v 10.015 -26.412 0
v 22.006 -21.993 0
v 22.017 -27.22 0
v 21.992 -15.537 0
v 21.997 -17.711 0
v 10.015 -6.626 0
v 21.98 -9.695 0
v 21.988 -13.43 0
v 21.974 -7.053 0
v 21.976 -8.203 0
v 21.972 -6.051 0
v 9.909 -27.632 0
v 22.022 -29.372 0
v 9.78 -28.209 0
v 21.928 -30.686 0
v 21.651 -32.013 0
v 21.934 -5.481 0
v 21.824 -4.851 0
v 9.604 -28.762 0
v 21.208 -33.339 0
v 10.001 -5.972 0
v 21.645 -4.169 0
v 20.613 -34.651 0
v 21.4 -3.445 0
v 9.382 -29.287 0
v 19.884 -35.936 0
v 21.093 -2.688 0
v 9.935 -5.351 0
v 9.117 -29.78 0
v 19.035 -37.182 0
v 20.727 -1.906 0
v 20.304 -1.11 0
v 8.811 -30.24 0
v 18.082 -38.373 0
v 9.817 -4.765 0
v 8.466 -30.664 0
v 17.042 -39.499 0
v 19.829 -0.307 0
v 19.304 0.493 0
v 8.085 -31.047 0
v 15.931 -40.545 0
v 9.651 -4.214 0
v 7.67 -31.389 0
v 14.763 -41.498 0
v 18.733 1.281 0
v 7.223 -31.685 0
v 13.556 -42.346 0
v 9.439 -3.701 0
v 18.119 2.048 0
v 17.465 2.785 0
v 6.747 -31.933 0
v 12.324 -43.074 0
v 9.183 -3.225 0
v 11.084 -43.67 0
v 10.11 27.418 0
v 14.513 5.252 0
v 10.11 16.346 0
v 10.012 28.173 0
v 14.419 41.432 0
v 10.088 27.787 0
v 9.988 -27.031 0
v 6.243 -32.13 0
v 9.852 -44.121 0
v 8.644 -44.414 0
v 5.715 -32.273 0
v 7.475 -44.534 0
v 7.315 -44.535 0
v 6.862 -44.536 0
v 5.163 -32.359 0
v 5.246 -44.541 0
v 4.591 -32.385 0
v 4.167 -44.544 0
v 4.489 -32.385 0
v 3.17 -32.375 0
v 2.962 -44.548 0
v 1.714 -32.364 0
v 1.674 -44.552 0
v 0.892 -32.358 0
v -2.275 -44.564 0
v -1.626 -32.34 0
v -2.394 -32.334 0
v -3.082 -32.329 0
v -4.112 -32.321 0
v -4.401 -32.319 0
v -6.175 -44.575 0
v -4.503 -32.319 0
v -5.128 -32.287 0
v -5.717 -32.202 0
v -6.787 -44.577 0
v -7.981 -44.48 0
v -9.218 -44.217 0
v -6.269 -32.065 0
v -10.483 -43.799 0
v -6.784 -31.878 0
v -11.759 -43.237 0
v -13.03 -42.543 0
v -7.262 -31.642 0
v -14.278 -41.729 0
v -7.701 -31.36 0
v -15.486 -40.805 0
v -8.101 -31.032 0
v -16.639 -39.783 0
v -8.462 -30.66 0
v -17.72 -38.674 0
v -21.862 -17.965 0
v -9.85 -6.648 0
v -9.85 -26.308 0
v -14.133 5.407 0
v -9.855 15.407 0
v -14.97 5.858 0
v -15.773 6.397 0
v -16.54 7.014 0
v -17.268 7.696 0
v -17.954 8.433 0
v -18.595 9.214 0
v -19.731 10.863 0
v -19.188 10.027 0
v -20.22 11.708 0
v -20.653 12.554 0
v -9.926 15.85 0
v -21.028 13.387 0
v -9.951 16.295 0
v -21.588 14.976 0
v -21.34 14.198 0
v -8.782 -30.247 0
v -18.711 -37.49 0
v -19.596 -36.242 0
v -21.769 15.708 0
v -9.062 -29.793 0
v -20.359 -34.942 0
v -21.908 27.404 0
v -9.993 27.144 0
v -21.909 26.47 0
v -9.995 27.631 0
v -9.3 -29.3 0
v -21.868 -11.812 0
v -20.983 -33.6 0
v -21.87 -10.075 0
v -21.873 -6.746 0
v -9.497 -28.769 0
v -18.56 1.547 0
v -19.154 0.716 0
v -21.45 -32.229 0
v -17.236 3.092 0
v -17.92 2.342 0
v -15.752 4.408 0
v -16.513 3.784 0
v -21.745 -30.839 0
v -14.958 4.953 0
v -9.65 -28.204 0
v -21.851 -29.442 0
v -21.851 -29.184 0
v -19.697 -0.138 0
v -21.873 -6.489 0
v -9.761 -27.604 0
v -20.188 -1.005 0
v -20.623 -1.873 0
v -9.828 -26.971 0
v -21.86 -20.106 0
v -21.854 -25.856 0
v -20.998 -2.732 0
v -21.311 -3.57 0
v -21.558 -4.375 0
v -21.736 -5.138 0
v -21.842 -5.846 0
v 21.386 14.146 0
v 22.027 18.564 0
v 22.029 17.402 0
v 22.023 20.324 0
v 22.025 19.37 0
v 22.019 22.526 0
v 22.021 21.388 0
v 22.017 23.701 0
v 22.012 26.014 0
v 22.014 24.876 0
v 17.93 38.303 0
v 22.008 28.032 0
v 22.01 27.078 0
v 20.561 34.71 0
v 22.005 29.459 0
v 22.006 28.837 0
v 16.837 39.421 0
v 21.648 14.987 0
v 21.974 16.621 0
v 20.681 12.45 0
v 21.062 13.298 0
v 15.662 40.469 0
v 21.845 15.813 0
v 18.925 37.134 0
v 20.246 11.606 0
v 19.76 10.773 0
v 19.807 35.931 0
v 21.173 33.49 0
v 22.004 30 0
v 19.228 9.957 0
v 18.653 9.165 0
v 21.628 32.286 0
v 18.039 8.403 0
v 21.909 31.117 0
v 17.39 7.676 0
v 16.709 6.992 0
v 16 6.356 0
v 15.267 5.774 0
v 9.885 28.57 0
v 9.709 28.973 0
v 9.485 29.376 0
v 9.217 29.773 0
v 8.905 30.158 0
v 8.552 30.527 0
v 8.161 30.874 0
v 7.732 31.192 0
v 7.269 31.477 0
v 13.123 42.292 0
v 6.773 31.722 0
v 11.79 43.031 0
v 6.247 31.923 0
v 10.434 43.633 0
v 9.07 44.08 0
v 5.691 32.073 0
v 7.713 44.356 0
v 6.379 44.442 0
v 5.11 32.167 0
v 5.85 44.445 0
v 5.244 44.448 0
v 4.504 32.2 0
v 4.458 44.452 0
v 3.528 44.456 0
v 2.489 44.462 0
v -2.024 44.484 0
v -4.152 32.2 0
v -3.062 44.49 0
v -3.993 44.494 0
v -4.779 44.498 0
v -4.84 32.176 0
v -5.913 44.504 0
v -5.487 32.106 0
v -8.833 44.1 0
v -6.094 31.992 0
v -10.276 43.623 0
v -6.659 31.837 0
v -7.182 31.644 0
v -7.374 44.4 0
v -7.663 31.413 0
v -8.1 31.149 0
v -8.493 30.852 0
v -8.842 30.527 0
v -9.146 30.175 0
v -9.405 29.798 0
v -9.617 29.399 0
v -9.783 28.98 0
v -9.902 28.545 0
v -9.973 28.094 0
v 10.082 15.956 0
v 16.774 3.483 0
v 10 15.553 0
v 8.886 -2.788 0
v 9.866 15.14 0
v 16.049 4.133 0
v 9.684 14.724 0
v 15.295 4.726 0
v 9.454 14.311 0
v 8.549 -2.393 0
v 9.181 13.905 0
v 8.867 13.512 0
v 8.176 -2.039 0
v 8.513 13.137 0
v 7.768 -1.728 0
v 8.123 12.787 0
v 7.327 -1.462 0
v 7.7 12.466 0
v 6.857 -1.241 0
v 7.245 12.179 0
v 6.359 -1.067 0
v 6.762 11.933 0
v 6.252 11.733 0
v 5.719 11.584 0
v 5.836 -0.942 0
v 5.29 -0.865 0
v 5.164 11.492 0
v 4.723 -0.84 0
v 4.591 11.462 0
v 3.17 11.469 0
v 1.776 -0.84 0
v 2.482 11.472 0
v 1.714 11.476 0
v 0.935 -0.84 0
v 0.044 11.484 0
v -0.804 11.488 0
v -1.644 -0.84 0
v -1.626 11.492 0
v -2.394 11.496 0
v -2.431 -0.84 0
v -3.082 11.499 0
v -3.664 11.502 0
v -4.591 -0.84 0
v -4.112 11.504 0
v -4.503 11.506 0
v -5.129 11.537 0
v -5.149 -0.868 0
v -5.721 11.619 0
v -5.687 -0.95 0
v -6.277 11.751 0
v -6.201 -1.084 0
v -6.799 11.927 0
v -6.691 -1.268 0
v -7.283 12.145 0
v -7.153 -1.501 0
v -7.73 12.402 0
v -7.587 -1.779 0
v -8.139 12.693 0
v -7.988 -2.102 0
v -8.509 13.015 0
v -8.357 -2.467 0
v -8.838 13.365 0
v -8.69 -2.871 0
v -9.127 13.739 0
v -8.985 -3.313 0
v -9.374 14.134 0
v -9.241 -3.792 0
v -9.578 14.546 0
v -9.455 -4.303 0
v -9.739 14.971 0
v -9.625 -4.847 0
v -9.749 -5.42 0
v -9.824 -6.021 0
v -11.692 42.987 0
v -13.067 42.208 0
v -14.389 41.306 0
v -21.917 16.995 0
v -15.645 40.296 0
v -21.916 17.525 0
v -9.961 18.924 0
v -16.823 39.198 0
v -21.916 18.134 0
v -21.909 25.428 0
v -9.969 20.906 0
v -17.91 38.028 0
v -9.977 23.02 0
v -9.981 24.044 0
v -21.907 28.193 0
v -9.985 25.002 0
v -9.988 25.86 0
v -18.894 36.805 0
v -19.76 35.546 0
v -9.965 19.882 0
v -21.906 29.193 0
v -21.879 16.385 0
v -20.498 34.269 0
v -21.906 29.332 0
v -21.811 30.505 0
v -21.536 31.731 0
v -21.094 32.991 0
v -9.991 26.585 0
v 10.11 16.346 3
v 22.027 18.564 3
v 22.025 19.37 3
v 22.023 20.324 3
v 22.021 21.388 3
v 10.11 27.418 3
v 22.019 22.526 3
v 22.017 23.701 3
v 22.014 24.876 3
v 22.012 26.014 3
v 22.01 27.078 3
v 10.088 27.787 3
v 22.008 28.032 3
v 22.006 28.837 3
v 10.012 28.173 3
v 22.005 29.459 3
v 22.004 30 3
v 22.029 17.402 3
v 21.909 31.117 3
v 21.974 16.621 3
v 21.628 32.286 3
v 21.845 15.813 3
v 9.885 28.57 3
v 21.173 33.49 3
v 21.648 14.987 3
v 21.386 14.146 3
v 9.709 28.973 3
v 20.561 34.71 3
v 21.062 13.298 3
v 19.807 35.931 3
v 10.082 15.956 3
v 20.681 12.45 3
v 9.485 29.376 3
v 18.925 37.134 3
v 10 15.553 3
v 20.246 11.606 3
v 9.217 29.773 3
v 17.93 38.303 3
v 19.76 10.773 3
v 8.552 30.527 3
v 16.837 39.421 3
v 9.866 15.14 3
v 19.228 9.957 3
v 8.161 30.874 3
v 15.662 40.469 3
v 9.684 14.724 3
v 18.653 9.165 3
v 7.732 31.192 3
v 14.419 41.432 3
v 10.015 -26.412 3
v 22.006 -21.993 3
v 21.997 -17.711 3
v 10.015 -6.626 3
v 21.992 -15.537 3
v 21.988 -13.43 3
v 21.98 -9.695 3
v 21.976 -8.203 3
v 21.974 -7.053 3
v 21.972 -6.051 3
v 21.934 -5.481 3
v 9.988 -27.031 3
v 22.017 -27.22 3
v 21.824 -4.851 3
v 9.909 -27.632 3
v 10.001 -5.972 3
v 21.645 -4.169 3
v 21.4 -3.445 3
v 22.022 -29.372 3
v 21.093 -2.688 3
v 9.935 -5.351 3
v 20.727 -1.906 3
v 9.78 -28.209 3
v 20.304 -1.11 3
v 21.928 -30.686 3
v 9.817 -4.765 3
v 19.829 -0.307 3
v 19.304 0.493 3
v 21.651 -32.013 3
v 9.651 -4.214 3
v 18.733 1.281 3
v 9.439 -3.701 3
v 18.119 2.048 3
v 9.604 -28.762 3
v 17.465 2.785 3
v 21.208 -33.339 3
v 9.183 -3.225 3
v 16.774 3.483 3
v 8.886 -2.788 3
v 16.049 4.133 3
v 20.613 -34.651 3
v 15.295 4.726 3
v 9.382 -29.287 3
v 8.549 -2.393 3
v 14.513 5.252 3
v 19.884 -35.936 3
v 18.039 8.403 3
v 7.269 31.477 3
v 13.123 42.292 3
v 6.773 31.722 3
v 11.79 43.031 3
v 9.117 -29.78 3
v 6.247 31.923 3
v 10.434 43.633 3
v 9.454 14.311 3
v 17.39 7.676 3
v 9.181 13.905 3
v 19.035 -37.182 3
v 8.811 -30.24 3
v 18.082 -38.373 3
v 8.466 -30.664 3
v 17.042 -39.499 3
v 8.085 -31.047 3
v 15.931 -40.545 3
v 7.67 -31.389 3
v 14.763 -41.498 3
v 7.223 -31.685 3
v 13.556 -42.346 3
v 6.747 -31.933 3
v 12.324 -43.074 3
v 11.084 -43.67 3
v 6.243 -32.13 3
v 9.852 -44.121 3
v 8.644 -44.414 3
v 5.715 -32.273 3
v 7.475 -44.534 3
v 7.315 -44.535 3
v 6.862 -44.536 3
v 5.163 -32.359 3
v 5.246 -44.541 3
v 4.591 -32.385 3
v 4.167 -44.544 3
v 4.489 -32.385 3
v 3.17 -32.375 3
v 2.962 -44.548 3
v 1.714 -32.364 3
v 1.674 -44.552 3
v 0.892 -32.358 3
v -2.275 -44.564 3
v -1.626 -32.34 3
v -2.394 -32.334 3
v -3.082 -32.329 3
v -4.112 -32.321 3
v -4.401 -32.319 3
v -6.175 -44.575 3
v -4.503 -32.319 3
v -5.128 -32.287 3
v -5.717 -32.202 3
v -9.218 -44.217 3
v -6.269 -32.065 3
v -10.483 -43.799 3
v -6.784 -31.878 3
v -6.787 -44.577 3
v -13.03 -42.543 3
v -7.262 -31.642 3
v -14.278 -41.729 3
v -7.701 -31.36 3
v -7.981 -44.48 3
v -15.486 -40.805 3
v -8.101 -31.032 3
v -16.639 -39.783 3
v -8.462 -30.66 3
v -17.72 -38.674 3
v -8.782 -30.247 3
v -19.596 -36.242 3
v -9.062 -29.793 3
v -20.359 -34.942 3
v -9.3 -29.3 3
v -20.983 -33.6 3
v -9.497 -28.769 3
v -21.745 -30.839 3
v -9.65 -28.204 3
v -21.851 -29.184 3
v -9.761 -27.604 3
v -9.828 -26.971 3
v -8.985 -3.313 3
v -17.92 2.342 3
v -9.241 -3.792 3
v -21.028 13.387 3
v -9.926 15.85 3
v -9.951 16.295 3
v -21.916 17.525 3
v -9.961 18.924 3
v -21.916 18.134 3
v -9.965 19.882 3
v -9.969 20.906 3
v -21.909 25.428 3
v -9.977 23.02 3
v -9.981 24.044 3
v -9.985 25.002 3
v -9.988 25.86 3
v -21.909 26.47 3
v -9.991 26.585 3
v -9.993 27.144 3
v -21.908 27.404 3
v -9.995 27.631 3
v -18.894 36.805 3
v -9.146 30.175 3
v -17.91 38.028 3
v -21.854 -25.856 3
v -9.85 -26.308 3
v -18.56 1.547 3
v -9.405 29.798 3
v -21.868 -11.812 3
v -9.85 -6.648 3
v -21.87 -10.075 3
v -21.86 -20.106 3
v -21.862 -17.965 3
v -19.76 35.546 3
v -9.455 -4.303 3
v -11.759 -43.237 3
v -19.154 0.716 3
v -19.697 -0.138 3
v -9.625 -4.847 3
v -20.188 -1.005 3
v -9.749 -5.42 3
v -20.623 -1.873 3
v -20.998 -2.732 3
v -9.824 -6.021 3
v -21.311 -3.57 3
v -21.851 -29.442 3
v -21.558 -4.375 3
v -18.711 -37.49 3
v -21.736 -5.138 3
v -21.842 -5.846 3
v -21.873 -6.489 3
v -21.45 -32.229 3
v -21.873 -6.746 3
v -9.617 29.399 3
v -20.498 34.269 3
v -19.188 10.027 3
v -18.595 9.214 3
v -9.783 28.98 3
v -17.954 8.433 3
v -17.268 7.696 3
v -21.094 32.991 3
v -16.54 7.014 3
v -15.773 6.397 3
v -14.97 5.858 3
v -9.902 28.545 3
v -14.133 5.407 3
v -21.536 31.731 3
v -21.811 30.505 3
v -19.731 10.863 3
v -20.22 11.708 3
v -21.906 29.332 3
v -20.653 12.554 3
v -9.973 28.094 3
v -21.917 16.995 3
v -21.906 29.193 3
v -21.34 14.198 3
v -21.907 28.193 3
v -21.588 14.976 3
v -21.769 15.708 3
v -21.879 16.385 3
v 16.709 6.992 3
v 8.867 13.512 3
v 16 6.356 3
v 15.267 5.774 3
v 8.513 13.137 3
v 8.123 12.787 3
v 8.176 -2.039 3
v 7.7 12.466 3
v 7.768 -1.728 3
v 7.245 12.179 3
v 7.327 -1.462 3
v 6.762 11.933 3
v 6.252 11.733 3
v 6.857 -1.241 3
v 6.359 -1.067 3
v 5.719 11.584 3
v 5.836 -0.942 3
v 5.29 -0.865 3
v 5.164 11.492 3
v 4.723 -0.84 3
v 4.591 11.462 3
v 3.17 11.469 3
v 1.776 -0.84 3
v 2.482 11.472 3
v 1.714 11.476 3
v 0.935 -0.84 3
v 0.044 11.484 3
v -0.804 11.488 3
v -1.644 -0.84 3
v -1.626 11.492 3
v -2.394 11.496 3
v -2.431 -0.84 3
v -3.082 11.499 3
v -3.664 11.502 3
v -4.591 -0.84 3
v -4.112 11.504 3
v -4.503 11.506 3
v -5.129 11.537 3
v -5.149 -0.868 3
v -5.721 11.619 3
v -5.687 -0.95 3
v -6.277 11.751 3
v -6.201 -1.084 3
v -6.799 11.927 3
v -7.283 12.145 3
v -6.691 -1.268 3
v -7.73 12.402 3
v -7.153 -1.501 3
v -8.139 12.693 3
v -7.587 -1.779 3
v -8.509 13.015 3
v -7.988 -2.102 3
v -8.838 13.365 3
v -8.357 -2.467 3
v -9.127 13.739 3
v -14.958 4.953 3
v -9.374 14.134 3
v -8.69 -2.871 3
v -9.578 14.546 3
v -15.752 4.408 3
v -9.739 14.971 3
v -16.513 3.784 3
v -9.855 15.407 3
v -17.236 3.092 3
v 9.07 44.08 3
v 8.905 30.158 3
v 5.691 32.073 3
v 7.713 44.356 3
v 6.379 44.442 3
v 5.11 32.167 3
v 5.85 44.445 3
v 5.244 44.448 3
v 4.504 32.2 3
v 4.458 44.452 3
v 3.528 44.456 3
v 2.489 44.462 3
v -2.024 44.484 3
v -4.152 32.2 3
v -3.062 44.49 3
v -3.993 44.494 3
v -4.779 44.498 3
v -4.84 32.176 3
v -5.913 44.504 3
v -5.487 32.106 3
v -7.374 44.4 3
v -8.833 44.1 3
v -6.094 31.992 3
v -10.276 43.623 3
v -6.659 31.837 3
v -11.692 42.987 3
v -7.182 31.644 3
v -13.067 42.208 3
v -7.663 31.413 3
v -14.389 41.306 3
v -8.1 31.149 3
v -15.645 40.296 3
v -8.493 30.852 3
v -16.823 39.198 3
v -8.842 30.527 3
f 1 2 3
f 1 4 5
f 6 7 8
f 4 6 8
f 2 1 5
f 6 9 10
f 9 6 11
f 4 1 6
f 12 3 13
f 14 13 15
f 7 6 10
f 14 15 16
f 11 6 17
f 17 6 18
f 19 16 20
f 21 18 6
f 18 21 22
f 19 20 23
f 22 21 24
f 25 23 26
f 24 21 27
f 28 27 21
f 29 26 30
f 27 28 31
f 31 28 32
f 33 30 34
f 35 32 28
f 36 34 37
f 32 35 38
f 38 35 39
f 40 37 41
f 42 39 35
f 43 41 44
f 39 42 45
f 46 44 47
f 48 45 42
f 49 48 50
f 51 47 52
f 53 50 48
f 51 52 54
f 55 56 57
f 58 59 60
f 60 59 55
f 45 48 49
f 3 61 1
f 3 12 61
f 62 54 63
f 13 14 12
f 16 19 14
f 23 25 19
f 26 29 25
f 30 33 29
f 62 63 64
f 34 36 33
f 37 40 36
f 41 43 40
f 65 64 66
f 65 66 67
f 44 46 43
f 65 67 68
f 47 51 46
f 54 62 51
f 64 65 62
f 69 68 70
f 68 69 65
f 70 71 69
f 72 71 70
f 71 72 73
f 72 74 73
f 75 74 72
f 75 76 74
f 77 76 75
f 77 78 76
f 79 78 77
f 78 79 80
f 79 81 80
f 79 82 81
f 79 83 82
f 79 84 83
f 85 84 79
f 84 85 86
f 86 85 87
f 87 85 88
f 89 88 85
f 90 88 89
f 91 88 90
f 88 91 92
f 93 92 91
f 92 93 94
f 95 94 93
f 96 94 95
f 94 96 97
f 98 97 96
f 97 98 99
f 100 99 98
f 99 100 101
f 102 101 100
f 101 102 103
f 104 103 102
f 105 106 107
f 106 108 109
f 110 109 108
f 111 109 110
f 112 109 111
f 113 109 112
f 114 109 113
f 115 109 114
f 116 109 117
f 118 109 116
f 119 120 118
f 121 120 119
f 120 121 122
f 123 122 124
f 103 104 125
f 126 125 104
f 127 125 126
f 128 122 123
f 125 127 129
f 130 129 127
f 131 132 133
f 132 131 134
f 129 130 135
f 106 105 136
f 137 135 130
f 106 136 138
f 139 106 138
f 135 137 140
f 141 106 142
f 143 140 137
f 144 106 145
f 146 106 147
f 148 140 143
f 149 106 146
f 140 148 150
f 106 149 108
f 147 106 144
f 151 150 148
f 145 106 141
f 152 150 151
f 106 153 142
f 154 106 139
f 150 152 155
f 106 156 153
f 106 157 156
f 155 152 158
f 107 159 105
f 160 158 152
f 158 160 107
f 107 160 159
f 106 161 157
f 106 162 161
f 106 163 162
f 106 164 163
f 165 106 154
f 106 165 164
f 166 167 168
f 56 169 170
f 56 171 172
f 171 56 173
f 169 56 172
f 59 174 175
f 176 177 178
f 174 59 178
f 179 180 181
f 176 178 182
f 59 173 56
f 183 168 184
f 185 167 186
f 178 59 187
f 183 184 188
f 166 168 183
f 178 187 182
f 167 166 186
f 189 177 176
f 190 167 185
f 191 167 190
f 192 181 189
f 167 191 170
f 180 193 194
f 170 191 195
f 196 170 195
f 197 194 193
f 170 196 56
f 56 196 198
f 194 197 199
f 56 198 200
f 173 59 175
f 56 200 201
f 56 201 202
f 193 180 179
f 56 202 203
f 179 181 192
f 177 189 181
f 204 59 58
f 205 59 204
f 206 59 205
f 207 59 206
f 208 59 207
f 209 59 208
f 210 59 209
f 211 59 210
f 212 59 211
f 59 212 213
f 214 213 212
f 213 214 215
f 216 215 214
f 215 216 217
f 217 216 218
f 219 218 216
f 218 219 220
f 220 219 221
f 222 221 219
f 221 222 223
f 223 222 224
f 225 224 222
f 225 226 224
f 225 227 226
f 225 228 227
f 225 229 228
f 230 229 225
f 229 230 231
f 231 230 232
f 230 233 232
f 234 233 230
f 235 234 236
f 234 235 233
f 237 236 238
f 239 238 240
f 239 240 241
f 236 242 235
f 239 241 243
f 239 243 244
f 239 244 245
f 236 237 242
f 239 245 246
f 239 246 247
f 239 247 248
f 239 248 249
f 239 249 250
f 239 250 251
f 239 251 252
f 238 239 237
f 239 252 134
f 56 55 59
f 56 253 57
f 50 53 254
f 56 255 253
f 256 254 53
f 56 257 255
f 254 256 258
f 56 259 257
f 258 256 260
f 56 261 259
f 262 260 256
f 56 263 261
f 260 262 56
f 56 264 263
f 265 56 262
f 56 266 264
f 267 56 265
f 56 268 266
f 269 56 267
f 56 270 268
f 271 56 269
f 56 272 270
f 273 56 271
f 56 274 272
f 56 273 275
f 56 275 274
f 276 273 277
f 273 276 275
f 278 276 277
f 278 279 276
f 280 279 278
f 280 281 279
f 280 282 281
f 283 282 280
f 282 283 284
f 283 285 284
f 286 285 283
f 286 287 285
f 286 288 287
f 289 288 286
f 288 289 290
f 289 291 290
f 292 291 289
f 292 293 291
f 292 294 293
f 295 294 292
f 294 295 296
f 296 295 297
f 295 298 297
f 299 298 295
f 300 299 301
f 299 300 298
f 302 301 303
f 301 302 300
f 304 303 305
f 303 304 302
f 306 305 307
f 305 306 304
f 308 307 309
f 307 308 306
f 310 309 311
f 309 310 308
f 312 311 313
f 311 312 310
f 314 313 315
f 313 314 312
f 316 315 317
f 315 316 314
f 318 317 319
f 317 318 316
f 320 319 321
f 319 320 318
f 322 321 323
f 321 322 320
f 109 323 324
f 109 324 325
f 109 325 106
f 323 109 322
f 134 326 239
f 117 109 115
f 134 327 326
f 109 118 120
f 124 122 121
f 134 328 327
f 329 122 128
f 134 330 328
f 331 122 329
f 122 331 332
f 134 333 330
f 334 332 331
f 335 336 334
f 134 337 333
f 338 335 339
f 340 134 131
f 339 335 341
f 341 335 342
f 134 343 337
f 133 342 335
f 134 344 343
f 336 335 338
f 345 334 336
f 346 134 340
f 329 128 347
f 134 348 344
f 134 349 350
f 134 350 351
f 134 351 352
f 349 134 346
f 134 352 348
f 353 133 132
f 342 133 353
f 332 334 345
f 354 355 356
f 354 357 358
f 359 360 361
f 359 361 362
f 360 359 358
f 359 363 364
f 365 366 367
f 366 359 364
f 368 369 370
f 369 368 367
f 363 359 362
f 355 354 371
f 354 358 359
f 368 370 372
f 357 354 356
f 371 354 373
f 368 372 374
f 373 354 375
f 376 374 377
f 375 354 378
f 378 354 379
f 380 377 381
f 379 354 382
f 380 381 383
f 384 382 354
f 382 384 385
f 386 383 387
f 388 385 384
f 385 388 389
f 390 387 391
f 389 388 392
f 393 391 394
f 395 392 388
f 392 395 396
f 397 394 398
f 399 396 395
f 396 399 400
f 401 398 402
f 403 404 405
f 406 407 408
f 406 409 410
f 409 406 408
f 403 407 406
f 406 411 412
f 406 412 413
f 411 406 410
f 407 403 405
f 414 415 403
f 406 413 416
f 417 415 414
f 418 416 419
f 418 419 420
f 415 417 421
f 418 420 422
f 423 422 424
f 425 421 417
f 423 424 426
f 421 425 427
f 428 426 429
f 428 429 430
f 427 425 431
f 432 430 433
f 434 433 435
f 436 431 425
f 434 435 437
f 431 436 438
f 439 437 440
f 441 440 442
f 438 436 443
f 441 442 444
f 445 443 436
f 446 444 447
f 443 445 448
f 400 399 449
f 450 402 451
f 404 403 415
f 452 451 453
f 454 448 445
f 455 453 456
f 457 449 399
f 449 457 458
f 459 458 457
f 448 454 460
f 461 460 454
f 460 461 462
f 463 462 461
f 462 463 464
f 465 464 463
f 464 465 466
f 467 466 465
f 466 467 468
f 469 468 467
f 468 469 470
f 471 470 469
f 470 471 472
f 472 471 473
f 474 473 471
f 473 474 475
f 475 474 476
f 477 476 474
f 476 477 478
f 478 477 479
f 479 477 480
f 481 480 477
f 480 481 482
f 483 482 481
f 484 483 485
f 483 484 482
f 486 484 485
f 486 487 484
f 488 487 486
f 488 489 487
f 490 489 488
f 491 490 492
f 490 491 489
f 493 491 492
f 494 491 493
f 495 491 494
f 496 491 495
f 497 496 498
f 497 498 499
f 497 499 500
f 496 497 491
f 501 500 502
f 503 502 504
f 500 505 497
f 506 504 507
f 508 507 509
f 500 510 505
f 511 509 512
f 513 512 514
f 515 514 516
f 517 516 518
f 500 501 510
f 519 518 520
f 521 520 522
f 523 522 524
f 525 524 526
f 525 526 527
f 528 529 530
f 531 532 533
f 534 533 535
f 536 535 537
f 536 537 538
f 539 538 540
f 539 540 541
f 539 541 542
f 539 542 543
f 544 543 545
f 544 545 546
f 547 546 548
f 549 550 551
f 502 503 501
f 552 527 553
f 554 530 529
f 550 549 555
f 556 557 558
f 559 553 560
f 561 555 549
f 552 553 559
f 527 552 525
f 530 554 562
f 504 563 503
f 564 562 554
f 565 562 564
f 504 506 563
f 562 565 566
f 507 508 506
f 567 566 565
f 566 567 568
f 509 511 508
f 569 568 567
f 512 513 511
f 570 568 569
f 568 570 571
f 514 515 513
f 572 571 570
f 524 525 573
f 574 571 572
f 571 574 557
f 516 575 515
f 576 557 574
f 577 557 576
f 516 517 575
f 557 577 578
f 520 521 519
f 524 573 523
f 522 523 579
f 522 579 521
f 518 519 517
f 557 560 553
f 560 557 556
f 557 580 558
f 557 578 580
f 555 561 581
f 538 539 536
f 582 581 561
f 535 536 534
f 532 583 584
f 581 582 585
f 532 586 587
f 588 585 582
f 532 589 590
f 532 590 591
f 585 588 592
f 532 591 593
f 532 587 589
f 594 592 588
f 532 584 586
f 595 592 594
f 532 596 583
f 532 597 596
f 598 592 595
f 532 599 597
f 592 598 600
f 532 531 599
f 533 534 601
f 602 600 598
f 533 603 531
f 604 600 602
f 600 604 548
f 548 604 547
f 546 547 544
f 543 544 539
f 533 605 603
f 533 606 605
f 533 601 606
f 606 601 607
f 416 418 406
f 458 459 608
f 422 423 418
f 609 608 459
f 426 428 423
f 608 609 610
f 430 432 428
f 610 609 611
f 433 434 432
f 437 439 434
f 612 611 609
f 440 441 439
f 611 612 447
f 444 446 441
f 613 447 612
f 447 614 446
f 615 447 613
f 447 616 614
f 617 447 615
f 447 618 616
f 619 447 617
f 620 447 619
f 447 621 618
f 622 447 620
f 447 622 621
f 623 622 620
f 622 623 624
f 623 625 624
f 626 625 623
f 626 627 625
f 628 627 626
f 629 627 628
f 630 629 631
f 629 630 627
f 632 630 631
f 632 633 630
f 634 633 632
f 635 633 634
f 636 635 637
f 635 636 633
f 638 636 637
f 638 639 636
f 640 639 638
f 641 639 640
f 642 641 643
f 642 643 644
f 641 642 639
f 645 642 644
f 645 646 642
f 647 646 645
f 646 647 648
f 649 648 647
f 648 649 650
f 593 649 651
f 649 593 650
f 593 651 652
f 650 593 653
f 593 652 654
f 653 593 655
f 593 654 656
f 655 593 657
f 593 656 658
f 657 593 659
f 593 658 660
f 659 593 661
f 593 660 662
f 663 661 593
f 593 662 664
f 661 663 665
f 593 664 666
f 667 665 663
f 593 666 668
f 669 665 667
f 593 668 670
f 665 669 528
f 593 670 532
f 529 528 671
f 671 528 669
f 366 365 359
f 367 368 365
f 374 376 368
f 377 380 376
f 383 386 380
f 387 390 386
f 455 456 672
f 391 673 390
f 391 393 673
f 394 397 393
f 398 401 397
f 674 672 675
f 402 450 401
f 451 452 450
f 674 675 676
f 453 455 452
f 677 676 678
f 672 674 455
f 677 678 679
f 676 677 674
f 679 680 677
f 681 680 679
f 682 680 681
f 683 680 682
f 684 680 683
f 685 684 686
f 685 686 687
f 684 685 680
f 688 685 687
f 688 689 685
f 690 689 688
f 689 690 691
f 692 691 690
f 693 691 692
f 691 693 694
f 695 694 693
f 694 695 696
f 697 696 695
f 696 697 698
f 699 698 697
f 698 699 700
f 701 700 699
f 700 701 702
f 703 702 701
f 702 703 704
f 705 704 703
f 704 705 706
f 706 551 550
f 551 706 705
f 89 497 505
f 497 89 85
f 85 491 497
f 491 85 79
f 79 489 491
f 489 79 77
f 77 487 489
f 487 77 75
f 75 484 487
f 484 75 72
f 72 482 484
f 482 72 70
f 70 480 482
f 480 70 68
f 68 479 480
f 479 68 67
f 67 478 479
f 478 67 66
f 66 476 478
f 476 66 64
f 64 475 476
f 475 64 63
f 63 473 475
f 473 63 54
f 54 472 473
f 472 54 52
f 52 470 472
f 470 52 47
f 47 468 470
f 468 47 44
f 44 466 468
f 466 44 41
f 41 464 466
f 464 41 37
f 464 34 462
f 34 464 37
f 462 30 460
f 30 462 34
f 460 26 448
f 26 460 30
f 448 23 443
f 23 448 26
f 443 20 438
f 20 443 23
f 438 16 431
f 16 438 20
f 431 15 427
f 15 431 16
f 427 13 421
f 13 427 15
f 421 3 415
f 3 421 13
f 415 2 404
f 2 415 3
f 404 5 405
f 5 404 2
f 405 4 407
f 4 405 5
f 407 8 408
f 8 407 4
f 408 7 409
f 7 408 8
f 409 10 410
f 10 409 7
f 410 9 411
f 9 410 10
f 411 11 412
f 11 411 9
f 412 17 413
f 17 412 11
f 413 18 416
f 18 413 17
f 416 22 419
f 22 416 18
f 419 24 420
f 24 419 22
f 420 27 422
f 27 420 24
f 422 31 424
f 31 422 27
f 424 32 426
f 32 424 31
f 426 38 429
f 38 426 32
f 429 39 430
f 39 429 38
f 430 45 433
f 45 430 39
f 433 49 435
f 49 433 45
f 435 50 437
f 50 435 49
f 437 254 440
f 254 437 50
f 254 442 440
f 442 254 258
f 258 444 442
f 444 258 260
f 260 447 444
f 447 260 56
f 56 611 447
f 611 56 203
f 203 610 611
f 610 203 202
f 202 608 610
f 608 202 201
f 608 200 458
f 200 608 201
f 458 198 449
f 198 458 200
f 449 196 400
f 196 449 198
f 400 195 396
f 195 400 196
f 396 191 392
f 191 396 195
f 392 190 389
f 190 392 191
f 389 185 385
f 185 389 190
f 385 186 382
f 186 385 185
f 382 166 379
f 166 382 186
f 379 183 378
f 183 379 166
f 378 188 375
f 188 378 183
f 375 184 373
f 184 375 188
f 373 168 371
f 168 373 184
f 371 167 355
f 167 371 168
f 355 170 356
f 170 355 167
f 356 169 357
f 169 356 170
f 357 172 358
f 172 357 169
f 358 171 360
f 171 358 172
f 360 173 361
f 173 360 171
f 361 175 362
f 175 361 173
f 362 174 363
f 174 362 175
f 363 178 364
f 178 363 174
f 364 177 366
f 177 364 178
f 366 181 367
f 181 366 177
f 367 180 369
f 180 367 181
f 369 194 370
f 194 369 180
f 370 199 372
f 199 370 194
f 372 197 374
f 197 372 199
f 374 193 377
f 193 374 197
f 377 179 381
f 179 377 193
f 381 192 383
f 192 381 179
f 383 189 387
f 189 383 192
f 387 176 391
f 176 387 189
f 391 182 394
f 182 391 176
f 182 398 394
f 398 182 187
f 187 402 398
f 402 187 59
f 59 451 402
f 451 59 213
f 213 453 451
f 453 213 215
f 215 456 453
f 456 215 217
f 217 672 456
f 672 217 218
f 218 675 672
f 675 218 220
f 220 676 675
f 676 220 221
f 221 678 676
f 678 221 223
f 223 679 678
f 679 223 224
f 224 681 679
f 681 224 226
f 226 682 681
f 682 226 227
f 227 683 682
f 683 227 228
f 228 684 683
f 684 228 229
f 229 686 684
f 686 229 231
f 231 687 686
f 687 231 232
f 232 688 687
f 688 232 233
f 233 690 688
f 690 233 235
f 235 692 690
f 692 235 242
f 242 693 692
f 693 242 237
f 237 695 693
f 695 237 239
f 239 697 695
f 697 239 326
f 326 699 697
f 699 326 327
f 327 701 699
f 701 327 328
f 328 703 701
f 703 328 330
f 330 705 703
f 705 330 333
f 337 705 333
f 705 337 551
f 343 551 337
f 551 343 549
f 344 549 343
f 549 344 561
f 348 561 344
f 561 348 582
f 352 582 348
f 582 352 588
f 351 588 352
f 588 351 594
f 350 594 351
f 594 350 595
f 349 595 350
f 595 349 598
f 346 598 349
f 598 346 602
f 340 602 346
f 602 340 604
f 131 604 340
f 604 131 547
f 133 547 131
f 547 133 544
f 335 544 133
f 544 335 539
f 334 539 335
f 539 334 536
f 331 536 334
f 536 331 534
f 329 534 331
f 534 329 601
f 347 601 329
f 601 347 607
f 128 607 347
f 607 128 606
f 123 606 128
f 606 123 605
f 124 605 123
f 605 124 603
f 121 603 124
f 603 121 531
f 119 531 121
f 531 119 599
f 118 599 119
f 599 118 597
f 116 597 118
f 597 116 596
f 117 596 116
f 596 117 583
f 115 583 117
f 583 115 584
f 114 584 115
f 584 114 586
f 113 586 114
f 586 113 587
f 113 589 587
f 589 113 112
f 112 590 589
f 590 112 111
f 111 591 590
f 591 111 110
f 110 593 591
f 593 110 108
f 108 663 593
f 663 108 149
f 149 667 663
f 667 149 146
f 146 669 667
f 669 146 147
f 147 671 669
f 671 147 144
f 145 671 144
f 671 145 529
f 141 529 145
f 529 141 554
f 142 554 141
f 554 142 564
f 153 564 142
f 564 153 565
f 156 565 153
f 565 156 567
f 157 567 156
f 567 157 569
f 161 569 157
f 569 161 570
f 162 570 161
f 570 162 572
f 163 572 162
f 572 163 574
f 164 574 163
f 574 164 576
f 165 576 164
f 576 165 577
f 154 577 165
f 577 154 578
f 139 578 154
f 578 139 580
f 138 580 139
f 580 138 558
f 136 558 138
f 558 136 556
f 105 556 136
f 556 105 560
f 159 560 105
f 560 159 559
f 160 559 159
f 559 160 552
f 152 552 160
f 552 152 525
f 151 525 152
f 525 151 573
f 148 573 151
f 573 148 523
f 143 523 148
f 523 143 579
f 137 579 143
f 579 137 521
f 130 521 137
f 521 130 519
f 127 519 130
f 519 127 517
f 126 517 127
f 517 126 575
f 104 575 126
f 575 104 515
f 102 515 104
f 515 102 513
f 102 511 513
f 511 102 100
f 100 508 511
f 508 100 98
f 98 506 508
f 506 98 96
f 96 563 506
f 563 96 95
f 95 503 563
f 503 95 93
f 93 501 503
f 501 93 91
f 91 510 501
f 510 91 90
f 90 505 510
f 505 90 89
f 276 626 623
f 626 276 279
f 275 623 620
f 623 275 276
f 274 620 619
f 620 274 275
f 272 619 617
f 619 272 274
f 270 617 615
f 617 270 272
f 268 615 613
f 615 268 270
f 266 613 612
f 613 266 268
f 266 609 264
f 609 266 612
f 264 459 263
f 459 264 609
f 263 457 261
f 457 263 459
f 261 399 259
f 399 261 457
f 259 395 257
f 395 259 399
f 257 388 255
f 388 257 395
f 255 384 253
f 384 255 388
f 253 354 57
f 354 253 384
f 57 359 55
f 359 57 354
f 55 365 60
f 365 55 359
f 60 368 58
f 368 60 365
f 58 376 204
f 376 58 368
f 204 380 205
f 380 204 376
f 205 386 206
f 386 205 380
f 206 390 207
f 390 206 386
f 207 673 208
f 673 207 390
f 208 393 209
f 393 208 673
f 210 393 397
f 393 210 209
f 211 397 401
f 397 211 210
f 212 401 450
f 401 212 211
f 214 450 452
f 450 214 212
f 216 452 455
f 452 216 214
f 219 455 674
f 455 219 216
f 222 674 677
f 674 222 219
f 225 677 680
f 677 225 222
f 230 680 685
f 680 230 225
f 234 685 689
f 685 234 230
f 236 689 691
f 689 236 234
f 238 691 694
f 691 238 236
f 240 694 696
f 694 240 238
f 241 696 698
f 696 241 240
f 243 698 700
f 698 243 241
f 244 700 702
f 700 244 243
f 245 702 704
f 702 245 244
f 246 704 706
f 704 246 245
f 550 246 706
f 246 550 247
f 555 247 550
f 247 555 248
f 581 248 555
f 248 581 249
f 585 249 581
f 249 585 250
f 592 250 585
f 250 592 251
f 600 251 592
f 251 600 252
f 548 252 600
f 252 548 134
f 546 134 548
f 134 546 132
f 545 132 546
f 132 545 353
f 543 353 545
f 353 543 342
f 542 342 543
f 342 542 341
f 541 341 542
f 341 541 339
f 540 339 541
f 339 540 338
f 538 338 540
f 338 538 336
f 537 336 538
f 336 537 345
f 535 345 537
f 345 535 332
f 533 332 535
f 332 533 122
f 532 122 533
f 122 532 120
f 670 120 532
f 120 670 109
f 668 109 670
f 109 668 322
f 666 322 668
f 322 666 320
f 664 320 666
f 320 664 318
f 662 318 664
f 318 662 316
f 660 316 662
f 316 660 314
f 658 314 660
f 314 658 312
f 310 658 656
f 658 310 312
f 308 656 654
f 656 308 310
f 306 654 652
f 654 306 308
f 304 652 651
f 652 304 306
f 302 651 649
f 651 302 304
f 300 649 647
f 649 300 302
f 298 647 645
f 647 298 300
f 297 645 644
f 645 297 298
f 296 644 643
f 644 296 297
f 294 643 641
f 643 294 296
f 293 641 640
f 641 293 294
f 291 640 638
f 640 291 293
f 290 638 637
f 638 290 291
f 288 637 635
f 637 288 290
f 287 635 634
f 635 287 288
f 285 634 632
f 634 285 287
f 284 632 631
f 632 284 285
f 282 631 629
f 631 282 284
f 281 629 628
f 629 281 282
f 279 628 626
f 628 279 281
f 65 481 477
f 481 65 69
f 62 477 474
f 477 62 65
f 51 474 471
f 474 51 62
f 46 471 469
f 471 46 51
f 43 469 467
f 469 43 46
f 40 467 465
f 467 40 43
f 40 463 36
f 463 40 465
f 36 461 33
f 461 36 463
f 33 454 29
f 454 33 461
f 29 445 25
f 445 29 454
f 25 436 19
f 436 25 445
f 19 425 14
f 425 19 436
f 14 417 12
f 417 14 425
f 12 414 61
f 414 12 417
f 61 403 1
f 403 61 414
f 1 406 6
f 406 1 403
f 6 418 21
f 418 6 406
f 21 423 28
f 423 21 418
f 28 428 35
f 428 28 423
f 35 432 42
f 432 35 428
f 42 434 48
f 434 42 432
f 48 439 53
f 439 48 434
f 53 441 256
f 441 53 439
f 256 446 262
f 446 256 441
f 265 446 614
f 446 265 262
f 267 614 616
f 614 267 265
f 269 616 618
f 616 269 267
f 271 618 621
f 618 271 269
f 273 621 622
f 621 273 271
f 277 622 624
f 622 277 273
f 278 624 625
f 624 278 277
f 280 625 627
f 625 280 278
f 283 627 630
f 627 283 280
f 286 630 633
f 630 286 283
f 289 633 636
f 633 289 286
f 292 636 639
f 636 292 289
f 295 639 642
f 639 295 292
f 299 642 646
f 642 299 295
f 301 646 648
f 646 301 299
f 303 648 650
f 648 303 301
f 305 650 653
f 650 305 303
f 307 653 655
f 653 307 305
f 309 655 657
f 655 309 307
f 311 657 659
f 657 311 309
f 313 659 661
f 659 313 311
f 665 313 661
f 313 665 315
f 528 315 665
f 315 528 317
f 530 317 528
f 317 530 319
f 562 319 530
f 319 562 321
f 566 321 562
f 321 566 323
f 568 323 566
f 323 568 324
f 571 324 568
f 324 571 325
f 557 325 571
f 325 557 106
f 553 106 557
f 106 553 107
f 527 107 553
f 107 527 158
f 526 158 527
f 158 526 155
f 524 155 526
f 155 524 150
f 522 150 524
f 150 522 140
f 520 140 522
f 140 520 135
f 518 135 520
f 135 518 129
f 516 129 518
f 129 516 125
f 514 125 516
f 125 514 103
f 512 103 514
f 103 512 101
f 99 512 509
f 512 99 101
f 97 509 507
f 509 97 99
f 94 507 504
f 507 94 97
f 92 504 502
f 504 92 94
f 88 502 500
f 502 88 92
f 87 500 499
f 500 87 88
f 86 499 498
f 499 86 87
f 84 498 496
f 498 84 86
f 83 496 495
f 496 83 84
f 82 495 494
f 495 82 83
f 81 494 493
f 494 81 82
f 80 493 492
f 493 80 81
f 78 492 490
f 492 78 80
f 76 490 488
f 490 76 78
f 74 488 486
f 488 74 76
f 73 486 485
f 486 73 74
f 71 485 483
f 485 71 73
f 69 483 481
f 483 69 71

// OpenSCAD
// Generated from 交通部公路局（原交通部公路總局）「新式號牌使用之英文字、數字字體」author trace
fudge = 0.1;

module glyph_2012_8(h = 3) {
  difference() {
    linear_extrude(height = h)
      polygon(points = [[-5.9135, 44.5041], [-7.3743, 44.3997], [-8.8327, 44.1003], [-10.276, 43.6235], [-11.6916, 42.987], [-13.0668, 42.2085], [-14.389, 41.3057], [-15.6454, 40.2963], [-16.8234, 39.198], [-17.9104, 38.0284], [-18.8936, 36.8052], [-19.7605, 35.5461], [-20.4983, 34.2689], [-21.0945, 32.9912], [-21.5362, 31.7306], [-21.811, 30.5049], [-21.906, 29.3318], [-21.9062, 29.1932], [-21.9065, 28.8017], [-21.907, 28.1933], [-21.9077, 27.4041], [-21.9086, 26.4705], [-21.9095, 25.4283], [-21.9105, 24.3139], [-21.9115, 23.1634], [-21.9125, 22.0129], [-21.9135, 20.8985], [-21.9144, 19.8564], [-21.9152, 18.9227], [-21.9159, 18.1336], [-21.9165, 17.5252], [-21.9168, 17.1336], [-21.9169, 16.9951], [-21.8795, 16.3852], [-21.769, 15.7085], [-21.5884, 14.9759], [-21.3404, 14.1985], [-21.0278, 13.3875], [-20.6535, 12.5538], [-20.2202, 11.7085], [-19.7308, 10.8627], [-19.1881, 10.0275], [-18.5949, 9.214], [-17.954, 8.4331], [-17.2683, 7.696], [-16.5404, 7.0137], [-15.7734, 6.3973], [-14.9699, 5.858], [-14.1328, 5.4066], [-14.9578, 4.9528], [-15.7522, 4.4083], [-16.5129, 3.7843], [-17.2365, 3.092], [-17.92, 2.3424], [-18.5601, 1.5467], [-19.1536, 0.7162], [-19.6974, -0.1381], [-20.1882, -1.0049], [-20.6229, -1.8733], [-20.9983, -2.7319], [-21.3111, -3.5696], [-21.5582, -4.3753], [-21.7363, -5.1378], [-21.8424, -5.846], [-21.8731, -6.4887], [-21.8728, -6.7465], [-21.8721, -7.475], [-21.871, -8.607], [-21.8696, -10.0752], [-21.868, -11.8124], [-21.8661, -13.7513], [-21.8641, -15.8247], [-21.862, -17.9654], [-21.86, -20.106], [-21.858, -22.1795], [-21.8561, -24.1184], [-21.8544, -25.8556], [-21.853, -27.3238], [-21.8519, -28.4558], [-21.8512, -29.1843], [-21.851, -29.442], [-21.7454, -30.839], [-21.4505, -32.2289], [-20.9829, -33.6004], [-20.3593, -34.942], [-19.5965, -36.2424], [-18.7111, -37.4903], [-17.7198, -38.6742], [-16.6393, -39.7829], [-15.4864, -40.8049], [-14.2776, -41.7288], [-13.0297, -42.5433], [-11.7593, -43.2371], [-10.4833, -43.7988], [-9.2181, -44.2169], [-7.9807, -44.4802], [-6.7875, -44.5772], [-6.6274, -44.5767], [-6.1747, -44.5753], [-5.4713, -44.5732], [-4.559, -44.5705], [-3.4796, -44.5673], [-2.2748, -44.5637], [-0.9865, -44.5598], [0.3437, -44.5558], [1.6738, -44.5518], [2.9622, -44.548], [4.167, -44.5444], [5.2464, -44.5411], [6.1587, -44.5384], [6.8621, -44.5363], [7.3147, -44.5349], [7.4749, -44.5345], [8.644, -44.4136], [9.8525, -44.1211], [11.0845, -43.6702], [12.3242, -43.074], [13.5557, -42.3456], [14.7631, -41.4982], [15.9306, -40.545], [17.0422, -39.499], [18.0822, -38.3735], [19.0347, -37.1816], [19.8837, -35.9365], [20.6134, -34.6512], [21.2079, -33.339], [21.6515, -32.0129], [21.9281, -30.6862], [22.022, -29.372], [22.0214, -29.1101], [22.0198, -28.3699], [22.0173, -27.2198], [22.0141, -25.7281], [22.0103, -23.9631], [22.0061, -21.9931], [22.0015, -19.8865], [21.9968, -17.7115], [21.9922, -15.5366], [21.9876, -13.4299], [21.9834, -11.4599], [21.9796, -9.6949], [21.9763, -8.2032], [21.9739, -7.0531], [21.9723, -6.3129], [21.9717, -6.051], [21.9339, -5.4811], [21.8239, -4.8509], [21.645, -4.1692], [21.4003, -3.4452], [21.0932, -2.688], [20.7268, -1.9065], [20.3044, -1.1098], [19.8291, -0.3069], [19.3043, 0.493], [18.7332, 1.2811], [18.1189, 2.0481], [17.4647, 2.7852], [16.7738, 3.4832], [16.0495, 4.133], [15.295, 4.7258], [14.5135, 5.2524], [15.2672, 5.7737], [16.0003, 6.3556], [16.7092, 6.9919], [17.3902, 7.6763], [18.0395, 8.4028], [18.6534, 9.1652], [19.2282, 9.9572], [19.7602, 10.7727], [20.2457, 11.6056], [20.681, 12.4496], [21.0623, 13.2985], [21.3859, 14.1463], [21.6481, 14.9867], [21.8453, 15.8135], [21.9736, 16.6206], [22.0295, 17.4018], [22.0292, 17.5433], [22.0284, 17.9432], [22.0271, 18.5645], [22.0254, 19.3703], [22.0235, 20.3238], [22.0213, 21.388], [22.019, 22.5261], [22.0166, 23.701], [22.0141, 24.8759], [22.0118, 26.014], [22.0096, 27.0782], [22.0077, 28.0317], [22.006, 28.8375], [22.0048, 29.4588], [22.0039, 29.8587], [22.0036, 30.0002], [21.9095, 31.1175], [21.6278, 32.2864], [21.1735, 33.4898], [20.5615, 34.7103], [19.807, 35.9309], [18.9248, 37.1342], [17.9299, 38.3033], [16.8373, 39.4207], [15.6621, 40.4695], [14.4191, 41.4323], [13.1235, 42.292], [11.79, 43.0313], [10.4339, 43.6332], [9.0699, 44.0804], [7.7132, 44.3557], [6.3787, 44.4419], [6.2407, 44.4426], [5.8505, 44.4446], [5.2443, 44.4476], [4.4581, 44.4516], [3.5278, 44.4563], [2.4894, 44.4616], [1.379, 44.4672], [0.2326, 44.473], [-0.9138, 44.4788], [-2.0241, 44.4844], [-3.0625, 44.4897], [-3.9928, 44.4944], [-4.7791, 44.4983], [-5.3853, 44.5014], [-5.7754, 44.5034]]);
    translate([0, 0, -fudge])
      linear_extrude(height = h + 2 * fudge)
        polygon(points = [[-4.1516, 32.2], [-4.0544, 32.2], [-3.7797, 32.2], [-3.3529, 32.2], [-2.7992, 32.2], [-2.1442, 32.2], [-1.413, 32.2], [-0.6312, 32.2], [0.1761, 32.2], [0.9833, 32.2], [1.7651, 32.2], [2.4963, 32.2], [3.1513, 32.2], [3.705, 32.2], [4.1318, 32.2], [4.4065, 32.2], [4.5037, 32.2], [5.1098, 32.1673], [5.6915, 32.0731], [6.2467, 31.9228], [6.7733, 31.7222], [7.2692, 31.4767], [7.7325, 31.192], [8.1609, 30.8736], [8.5525, 30.5272], [8.9052, 30.1584], [9.2169, 29.7727], [9.4855, 29.3758], [9.7089, 28.9731], [9.8851, 28.5704], [10.0121, 28.1732], [10.0877, 27.7871], [10.1098, 27.4177], [10.1098, 27.2934], [10.1098, 26.942], [10.1098, 26.3959], [10.1098, 25.6877], [10.1098, 24.8497], [10.1098, 23.9145], [10.1098, 22.9143], [10.1098, 21.8817], [10.1098, 20.8491], [10.1098, 19.849], [10.1098, 18.9137], [10.1098, 18.0757], [10.1098, 17.3675], [10.1098, 16.8215], [10.1098, 16.4701], [10.1098, 16.3457], [10.0819, 15.9563], [9.9999, 15.5526], [9.8662, 15.1402], [9.6836, 14.7244], [9.4544, 14.3108], [9.1813, 13.9048], [8.8667, 13.5118], [8.5133, 13.1373], [8.1235, 12.7868], [7.7, 12.4657], [7.2452, 12.1794], [6.7617, 11.9335], [6.252, 11.7333], [5.7187, 11.5844], [5.1643, 11.4922], [4.5914, 11.4621], [4.4892, 11.4626], [4.2006, 11.464], [3.7521, 11.4662], [3.1703, 11.469], [2.482, 11.4724], [1.7138, 11.4761], [0.8922, 11.4801], [0.044, 11.4842], [-0.8041, 11.4884], [-1.6257, 11.4923], [-2.3939, 11.4961], [-3.0823, 11.4994], [-3.664, 11.5023], [-4.1125, 11.5044], [-4.4012, 11.5058], [-4.5033, 11.5063], [-5.129, 11.5367], [-5.7207, 11.6193], [-6.2775, 11.7506], [-6.7986, 11.9271], [-7.2831, 12.1454], [-7.7302, 12.4018], [-8.139, 12.6929], [-8.5086, 13.0151], [-8.8382, 13.3651], [-9.1268, 13.7392], [-9.3737, 14.134], [-9.5779, 14.5459], [-9.7387, 14.9715], [-9.8551, 15.4072], [-9.9262, 15.8496], [-9.9513, 16.2951], [-9.9518, 16.4224], [-9.9532, 16.7822], [-9.9553, 17.3412], [-9.9581, 18.0663], [-9.9614, 18.9242], [-9.9652, 19.8818], [-9.9691, 20.9057], [-9.9732, 21.9629], [-9.9773, 23.0201], [-9.9812, 24.0441], [-9.9849, 25.0016], [-9.9883, 25.8596], [-9.9911, 26.5846], [-9.9932, 27.1437], [-9.9946, 27.5035], [-9.9951, 27.6308], [-9.9726, 28.0939], [-9.9017, 28.5446], [-9.7831, 28.9804], [-9.6173, 29.399], [-9.4048, 29.7979], [-9.1463, 30.1747], [-8.8423, 30.5271], [-8.4933, 30.8525], [-8.1, 31.1487], [-7.6628, 31.4132], [-7.1824, 31.6436], [-6.6594, 31.8375], [-6.0942, 31.9925], [-5.4874, 32.1062], [-4.8397, 32.1762], [-4.1516, 32.2], [-4.1516, 32.2], [-4.1516, 32.2], [-4.1516, 32.2], [-4.1516, 32.2], [-4.1516, 32.2], [-4.1516, 32.2], [-4.1516, 32.2], [-4.1516, 32.2], [-4.1516, 32.2], [-4.1516, 32.2], [-4.1516, 32.2], [-4.1516, 32.2], [-4.1516, 32.2], [-4.1516, 32.2], [-4.1516, 32.2]]);
    translate([0, 0, -fudge])
      linear_extrude(height = h + 2 * fudge)
        polygon(points = [[4.7232, -0.8396], [5.2901, -0.8653], [5.8363, -0.9416], [6.3594, -1.0674], [6.8572, -1.2412], [7.3274, -1.4619], [7.7677, -1.7283], [8.1757, -2.039], [8.5491, -2.3928], [8.8857, -2.7885], [9.1831, -3.2249], [9.439, -3.7006], [9.6511, -4.2144], [9.8171, -4.7651], [9.9347, -5.3514], [10.0015, -5.9721], [10.0153, -6.6259], [10.0153, -6.8482], [10.0153, -7.4761], [10.0153, -8.4519], [10.0153, -9.7175], [10.0153, -11.215], [10.0153, -12.8864], [10.0153, -14.6737], [10.0153, -16.519], [10.0153, -18.3643], [10.0153, -20.1516], [10.0153, -21.823], [10.0153, -23.3205], [10.0153, -24.5861], [10.0153, -25.5618], [10.0153, -26.1898], [10.0153, -26.412], [9.9885, -27.0315], [9.9094, -27.6316], [9.7805, -28.2094], [9.6038, -28.7621], [9.3818, -29.2867], [9.1167, -29.7805], [8.8107, -30.2404], [8.4661, -30.6637], [8.0851, -31.0475], [7.6701, -31.3889], [7.2233, -31.6849], [6.7469, -31.9328], [6.2433, -32.1297], [5.7146, -32.2727], [5.1632, -32.3589], [4.5914, -32.3854], [4.4892, -32.3846], [4.2006, -32.3825], [3.7521, -32.3792], [3.1703, -32.3749], [2.482, -32.3699], [1.7138, -32.3643], [0.8922, -32.3582], [0.044, -32.352], [-0.8041, -32.3458], [-1.6257, -32.3398], [-2.3939, -32.3341], [-3.0823, -32.3291], [-3.664, -32.3248], [-4.1125, -32.3215], [-4.4012, -32.3194], [-4.5033, -32.3187], [-5.1279, -32.2868], [-5.7167, -32.2016], [-6.269, -32.0646], [-6.7841, -31.8776], [-7.2616, -31.642], [-7.7007, -31.3596], [-8.1009, -31.0318], [-8.4616, -30.6604], [-8.7821, -30.2468], [-9.0618, -29.7927], [-9.3002, -29.2998], [-9.4966, -28.7695], [-9.6504, -28.2036], [-9.7611, -27.6036], [-9.8279, -26.971], [-9.8503, -26.3076], [-9.8503, -26.0869], [-9.8503, -25.4629], [-9.8503, -24.4934], [-9.8503, -23.2358], [-9.8503, -21.7479], [-9.8503, -20.0872], [-9.8503, -18.3113], [-9.8503, -16.4778], [-9.8503, -14.6443], [-9.8503, -12.8684], [-9.8503, -11.2077], [-9.8503, -9.7198], [-9.8503, -8.4623], [-9.8503, -7.4927], [-9.8503, -6.8688], [-9.8503, -6.648], [-9.8245, -6.0214], [-9.7486, -5.4205], [-9.6246, -4.8471], [-9.4546, -4.3035], [-9.2408, -3.7916], [-8.9851, -3.3134], [-8.6898, -2.8711], [-8.3568, -2.4666], [-7.9884, -2.102], [-7.5866, -1.7795], [-7.1534, -1.5009], [-6.691, -1.2684], [-6.2014, -1.0839], [-5.6869, -0.9497], [-5.1493, -0.8676], [-4.591, -0.8398], [-4.4864, -0.8398], [-4.1908, -0.8398], [-3.7314, -0.8398], [-3.1356, -0.8398], [-2.4307, -0.8398], [-1.6439, -0.8397], [-0.8025, -0.8397], [0.0661, -0.8397], [0.9348, -0.8397], [1.7762, -0.8396], [2.5629, -0.8396], [3.2679, -0.8396], [3.8637, -0.8396], [4.323, -0.8396], [4.6186, -0.8396]]);
  }
}

glyph_2012_8();
